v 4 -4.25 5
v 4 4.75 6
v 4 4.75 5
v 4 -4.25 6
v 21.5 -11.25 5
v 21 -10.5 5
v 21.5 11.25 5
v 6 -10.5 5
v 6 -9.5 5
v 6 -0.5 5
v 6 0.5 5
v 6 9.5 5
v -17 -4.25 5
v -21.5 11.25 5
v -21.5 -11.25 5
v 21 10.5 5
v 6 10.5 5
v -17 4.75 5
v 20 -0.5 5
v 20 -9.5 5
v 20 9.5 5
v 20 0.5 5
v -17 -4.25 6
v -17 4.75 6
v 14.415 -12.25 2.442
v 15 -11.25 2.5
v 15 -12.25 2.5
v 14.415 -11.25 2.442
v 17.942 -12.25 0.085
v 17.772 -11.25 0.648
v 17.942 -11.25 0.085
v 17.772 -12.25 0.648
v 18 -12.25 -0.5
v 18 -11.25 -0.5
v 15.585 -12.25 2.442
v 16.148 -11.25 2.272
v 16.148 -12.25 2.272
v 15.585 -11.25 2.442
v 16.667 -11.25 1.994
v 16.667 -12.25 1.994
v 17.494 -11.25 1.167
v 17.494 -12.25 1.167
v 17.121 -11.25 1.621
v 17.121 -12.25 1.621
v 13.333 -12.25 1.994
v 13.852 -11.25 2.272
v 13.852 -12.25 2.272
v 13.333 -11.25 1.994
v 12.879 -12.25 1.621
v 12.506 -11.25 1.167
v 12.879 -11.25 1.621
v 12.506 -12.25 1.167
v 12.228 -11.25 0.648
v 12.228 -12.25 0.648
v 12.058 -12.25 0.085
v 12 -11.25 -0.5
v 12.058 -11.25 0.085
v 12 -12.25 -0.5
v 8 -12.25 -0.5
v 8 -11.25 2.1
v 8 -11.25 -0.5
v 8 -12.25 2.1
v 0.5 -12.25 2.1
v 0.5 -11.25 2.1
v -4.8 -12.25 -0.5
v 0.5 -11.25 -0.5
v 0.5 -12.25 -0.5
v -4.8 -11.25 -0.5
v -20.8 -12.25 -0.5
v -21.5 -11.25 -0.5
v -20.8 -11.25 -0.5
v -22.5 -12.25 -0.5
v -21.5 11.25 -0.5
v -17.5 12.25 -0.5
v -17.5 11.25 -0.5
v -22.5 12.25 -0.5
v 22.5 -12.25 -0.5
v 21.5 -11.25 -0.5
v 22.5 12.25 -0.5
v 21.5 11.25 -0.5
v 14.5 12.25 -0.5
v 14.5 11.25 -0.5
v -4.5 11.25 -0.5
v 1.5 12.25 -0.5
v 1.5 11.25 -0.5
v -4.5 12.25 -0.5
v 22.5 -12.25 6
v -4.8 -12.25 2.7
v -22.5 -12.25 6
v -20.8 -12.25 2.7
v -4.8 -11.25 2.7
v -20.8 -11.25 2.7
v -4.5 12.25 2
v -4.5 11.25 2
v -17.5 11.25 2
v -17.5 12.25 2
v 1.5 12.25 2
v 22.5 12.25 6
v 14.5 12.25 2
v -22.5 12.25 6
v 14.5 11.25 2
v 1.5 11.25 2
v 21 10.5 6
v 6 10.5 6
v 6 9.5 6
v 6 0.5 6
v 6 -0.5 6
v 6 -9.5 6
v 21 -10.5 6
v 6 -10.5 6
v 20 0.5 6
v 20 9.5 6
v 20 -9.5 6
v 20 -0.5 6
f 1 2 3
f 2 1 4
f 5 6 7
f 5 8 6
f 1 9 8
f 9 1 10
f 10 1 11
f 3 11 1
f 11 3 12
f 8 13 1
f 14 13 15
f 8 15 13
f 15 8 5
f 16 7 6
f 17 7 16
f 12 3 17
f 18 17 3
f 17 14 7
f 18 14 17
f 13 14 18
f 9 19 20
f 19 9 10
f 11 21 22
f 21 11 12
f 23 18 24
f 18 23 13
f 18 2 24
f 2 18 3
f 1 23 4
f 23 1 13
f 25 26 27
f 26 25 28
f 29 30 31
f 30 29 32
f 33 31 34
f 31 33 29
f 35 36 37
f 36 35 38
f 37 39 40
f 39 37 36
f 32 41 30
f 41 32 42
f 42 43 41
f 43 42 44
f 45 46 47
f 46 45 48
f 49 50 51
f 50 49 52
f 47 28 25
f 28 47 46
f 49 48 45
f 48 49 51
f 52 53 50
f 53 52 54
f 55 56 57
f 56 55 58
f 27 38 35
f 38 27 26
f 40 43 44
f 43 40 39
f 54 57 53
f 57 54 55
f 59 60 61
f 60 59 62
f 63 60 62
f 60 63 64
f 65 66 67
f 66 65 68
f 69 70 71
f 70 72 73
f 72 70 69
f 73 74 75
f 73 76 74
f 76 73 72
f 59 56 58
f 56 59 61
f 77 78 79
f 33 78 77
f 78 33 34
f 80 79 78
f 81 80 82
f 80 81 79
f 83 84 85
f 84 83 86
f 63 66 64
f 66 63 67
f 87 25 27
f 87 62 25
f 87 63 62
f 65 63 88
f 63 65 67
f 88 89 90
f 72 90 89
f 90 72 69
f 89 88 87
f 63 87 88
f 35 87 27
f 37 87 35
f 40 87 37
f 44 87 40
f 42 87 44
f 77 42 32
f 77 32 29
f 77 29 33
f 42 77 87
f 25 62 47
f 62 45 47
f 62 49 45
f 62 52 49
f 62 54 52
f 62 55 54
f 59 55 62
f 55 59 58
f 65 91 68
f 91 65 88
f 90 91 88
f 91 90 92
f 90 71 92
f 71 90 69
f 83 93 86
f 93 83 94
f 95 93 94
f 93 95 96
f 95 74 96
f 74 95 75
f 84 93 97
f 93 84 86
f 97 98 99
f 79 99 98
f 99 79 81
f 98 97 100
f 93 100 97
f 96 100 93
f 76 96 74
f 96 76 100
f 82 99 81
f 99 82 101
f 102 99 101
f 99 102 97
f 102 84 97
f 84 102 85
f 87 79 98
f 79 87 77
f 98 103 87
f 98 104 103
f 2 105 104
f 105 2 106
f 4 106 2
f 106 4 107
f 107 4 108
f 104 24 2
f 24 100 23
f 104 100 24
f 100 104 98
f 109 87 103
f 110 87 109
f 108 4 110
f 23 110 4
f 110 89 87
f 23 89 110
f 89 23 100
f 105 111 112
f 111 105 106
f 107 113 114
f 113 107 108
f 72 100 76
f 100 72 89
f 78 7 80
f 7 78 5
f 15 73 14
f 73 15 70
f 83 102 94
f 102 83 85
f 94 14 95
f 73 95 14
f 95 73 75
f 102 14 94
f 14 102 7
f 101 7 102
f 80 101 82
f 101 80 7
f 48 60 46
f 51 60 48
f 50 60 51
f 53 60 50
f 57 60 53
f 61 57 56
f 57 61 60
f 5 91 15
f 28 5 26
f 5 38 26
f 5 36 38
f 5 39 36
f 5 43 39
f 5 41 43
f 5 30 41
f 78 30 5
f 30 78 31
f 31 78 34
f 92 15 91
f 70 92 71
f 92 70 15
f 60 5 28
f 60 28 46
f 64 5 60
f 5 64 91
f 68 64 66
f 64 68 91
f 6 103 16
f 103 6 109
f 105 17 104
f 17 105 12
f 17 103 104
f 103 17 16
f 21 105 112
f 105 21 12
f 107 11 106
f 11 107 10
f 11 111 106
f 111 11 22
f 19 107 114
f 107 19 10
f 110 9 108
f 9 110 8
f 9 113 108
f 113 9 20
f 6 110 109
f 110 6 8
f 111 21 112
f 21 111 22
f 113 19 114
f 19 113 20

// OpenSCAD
pcbwidth=42;
pcbdepth=21.5;
pcbheight=10;
wallth=1;

module pcb() {
    translate([-pcbwidth/2,-pcbdepth/2,-pcbheight/2]) {
        cube([pcbwidth,pcbdepth,pcbheight], center=false);
        translate([4,6.5,pcbheight])
            cube([20,8,2.5], center=false);
        translate([36,2,pcbheight-1.5])
            cube([4,3,2], center=false);
        translate([36,16,pcbheight-1.5])
            cube([4,3,2], center=false);
        
        translate([36,-1.5,4.5])
            rotate([90,0,0])
                cylinder(d=5, h=3, $fn=32, center=true);
        
        translate([21.75,-1.5,4.5])
            cube([6.75,3,2.6], center=false);
        
    }
}

module topcase() {
    intersection() {
    
    difference() {
        translate([0,0,0])
            cube([pcbwidth+2*wallth+1,pcbdepth+2*wallth+1,pcbheight+2*wallth], center=true);
        translate([0,0,-wallth])
            cube([pcbwidth+1,pcbdepth+1,pcbheight+2*wallth], center=true);
        
        translate([-pcbwidth/2,-pcbdepth/2,-pcbheight/2]) {
            translate([4,6.5,pcbheight])
                cube([21,9,2.5], center=false);
            
            translate([36,-1.5,4.5])
                rotate([90,0,0])
                    cylinder(d=6, h=3, $fn=32, center=true);
            
            translate([21.5,-1.5,4.5])
                cube([7.5,3,2.6], center=false);
            translate([21.5-15.3-6,-1.5,4.5])
                cube([16,3,3.2], center=false);
            
            translate([3.5,pcbdepth-1.5,4.5-3.5])
                cube([13,3,6], center=false);
            translate([3.5+13+6,pcbdepth-1.5,4.5-3.5])
                cube([13,3,6], center=false);
        }
        
        translate([6,9.5,0])
            cube([15,1,20]);
        translate([6,-0.5,0])
            cube([15,1,20]);
        translate([6,-9.5-1,0])
            cube([15,1,20]);
        translate([20,-9.5-1,0])
            cube([1,20,20]);
    }
    
    
        translate([0,0,5.5])
            cube([pcbwidth+2*wallth+1,pcbdepth+2*wallth+1,pcbheight+2*wallth], center=true);
    }
}

//pcb();
topcase();
